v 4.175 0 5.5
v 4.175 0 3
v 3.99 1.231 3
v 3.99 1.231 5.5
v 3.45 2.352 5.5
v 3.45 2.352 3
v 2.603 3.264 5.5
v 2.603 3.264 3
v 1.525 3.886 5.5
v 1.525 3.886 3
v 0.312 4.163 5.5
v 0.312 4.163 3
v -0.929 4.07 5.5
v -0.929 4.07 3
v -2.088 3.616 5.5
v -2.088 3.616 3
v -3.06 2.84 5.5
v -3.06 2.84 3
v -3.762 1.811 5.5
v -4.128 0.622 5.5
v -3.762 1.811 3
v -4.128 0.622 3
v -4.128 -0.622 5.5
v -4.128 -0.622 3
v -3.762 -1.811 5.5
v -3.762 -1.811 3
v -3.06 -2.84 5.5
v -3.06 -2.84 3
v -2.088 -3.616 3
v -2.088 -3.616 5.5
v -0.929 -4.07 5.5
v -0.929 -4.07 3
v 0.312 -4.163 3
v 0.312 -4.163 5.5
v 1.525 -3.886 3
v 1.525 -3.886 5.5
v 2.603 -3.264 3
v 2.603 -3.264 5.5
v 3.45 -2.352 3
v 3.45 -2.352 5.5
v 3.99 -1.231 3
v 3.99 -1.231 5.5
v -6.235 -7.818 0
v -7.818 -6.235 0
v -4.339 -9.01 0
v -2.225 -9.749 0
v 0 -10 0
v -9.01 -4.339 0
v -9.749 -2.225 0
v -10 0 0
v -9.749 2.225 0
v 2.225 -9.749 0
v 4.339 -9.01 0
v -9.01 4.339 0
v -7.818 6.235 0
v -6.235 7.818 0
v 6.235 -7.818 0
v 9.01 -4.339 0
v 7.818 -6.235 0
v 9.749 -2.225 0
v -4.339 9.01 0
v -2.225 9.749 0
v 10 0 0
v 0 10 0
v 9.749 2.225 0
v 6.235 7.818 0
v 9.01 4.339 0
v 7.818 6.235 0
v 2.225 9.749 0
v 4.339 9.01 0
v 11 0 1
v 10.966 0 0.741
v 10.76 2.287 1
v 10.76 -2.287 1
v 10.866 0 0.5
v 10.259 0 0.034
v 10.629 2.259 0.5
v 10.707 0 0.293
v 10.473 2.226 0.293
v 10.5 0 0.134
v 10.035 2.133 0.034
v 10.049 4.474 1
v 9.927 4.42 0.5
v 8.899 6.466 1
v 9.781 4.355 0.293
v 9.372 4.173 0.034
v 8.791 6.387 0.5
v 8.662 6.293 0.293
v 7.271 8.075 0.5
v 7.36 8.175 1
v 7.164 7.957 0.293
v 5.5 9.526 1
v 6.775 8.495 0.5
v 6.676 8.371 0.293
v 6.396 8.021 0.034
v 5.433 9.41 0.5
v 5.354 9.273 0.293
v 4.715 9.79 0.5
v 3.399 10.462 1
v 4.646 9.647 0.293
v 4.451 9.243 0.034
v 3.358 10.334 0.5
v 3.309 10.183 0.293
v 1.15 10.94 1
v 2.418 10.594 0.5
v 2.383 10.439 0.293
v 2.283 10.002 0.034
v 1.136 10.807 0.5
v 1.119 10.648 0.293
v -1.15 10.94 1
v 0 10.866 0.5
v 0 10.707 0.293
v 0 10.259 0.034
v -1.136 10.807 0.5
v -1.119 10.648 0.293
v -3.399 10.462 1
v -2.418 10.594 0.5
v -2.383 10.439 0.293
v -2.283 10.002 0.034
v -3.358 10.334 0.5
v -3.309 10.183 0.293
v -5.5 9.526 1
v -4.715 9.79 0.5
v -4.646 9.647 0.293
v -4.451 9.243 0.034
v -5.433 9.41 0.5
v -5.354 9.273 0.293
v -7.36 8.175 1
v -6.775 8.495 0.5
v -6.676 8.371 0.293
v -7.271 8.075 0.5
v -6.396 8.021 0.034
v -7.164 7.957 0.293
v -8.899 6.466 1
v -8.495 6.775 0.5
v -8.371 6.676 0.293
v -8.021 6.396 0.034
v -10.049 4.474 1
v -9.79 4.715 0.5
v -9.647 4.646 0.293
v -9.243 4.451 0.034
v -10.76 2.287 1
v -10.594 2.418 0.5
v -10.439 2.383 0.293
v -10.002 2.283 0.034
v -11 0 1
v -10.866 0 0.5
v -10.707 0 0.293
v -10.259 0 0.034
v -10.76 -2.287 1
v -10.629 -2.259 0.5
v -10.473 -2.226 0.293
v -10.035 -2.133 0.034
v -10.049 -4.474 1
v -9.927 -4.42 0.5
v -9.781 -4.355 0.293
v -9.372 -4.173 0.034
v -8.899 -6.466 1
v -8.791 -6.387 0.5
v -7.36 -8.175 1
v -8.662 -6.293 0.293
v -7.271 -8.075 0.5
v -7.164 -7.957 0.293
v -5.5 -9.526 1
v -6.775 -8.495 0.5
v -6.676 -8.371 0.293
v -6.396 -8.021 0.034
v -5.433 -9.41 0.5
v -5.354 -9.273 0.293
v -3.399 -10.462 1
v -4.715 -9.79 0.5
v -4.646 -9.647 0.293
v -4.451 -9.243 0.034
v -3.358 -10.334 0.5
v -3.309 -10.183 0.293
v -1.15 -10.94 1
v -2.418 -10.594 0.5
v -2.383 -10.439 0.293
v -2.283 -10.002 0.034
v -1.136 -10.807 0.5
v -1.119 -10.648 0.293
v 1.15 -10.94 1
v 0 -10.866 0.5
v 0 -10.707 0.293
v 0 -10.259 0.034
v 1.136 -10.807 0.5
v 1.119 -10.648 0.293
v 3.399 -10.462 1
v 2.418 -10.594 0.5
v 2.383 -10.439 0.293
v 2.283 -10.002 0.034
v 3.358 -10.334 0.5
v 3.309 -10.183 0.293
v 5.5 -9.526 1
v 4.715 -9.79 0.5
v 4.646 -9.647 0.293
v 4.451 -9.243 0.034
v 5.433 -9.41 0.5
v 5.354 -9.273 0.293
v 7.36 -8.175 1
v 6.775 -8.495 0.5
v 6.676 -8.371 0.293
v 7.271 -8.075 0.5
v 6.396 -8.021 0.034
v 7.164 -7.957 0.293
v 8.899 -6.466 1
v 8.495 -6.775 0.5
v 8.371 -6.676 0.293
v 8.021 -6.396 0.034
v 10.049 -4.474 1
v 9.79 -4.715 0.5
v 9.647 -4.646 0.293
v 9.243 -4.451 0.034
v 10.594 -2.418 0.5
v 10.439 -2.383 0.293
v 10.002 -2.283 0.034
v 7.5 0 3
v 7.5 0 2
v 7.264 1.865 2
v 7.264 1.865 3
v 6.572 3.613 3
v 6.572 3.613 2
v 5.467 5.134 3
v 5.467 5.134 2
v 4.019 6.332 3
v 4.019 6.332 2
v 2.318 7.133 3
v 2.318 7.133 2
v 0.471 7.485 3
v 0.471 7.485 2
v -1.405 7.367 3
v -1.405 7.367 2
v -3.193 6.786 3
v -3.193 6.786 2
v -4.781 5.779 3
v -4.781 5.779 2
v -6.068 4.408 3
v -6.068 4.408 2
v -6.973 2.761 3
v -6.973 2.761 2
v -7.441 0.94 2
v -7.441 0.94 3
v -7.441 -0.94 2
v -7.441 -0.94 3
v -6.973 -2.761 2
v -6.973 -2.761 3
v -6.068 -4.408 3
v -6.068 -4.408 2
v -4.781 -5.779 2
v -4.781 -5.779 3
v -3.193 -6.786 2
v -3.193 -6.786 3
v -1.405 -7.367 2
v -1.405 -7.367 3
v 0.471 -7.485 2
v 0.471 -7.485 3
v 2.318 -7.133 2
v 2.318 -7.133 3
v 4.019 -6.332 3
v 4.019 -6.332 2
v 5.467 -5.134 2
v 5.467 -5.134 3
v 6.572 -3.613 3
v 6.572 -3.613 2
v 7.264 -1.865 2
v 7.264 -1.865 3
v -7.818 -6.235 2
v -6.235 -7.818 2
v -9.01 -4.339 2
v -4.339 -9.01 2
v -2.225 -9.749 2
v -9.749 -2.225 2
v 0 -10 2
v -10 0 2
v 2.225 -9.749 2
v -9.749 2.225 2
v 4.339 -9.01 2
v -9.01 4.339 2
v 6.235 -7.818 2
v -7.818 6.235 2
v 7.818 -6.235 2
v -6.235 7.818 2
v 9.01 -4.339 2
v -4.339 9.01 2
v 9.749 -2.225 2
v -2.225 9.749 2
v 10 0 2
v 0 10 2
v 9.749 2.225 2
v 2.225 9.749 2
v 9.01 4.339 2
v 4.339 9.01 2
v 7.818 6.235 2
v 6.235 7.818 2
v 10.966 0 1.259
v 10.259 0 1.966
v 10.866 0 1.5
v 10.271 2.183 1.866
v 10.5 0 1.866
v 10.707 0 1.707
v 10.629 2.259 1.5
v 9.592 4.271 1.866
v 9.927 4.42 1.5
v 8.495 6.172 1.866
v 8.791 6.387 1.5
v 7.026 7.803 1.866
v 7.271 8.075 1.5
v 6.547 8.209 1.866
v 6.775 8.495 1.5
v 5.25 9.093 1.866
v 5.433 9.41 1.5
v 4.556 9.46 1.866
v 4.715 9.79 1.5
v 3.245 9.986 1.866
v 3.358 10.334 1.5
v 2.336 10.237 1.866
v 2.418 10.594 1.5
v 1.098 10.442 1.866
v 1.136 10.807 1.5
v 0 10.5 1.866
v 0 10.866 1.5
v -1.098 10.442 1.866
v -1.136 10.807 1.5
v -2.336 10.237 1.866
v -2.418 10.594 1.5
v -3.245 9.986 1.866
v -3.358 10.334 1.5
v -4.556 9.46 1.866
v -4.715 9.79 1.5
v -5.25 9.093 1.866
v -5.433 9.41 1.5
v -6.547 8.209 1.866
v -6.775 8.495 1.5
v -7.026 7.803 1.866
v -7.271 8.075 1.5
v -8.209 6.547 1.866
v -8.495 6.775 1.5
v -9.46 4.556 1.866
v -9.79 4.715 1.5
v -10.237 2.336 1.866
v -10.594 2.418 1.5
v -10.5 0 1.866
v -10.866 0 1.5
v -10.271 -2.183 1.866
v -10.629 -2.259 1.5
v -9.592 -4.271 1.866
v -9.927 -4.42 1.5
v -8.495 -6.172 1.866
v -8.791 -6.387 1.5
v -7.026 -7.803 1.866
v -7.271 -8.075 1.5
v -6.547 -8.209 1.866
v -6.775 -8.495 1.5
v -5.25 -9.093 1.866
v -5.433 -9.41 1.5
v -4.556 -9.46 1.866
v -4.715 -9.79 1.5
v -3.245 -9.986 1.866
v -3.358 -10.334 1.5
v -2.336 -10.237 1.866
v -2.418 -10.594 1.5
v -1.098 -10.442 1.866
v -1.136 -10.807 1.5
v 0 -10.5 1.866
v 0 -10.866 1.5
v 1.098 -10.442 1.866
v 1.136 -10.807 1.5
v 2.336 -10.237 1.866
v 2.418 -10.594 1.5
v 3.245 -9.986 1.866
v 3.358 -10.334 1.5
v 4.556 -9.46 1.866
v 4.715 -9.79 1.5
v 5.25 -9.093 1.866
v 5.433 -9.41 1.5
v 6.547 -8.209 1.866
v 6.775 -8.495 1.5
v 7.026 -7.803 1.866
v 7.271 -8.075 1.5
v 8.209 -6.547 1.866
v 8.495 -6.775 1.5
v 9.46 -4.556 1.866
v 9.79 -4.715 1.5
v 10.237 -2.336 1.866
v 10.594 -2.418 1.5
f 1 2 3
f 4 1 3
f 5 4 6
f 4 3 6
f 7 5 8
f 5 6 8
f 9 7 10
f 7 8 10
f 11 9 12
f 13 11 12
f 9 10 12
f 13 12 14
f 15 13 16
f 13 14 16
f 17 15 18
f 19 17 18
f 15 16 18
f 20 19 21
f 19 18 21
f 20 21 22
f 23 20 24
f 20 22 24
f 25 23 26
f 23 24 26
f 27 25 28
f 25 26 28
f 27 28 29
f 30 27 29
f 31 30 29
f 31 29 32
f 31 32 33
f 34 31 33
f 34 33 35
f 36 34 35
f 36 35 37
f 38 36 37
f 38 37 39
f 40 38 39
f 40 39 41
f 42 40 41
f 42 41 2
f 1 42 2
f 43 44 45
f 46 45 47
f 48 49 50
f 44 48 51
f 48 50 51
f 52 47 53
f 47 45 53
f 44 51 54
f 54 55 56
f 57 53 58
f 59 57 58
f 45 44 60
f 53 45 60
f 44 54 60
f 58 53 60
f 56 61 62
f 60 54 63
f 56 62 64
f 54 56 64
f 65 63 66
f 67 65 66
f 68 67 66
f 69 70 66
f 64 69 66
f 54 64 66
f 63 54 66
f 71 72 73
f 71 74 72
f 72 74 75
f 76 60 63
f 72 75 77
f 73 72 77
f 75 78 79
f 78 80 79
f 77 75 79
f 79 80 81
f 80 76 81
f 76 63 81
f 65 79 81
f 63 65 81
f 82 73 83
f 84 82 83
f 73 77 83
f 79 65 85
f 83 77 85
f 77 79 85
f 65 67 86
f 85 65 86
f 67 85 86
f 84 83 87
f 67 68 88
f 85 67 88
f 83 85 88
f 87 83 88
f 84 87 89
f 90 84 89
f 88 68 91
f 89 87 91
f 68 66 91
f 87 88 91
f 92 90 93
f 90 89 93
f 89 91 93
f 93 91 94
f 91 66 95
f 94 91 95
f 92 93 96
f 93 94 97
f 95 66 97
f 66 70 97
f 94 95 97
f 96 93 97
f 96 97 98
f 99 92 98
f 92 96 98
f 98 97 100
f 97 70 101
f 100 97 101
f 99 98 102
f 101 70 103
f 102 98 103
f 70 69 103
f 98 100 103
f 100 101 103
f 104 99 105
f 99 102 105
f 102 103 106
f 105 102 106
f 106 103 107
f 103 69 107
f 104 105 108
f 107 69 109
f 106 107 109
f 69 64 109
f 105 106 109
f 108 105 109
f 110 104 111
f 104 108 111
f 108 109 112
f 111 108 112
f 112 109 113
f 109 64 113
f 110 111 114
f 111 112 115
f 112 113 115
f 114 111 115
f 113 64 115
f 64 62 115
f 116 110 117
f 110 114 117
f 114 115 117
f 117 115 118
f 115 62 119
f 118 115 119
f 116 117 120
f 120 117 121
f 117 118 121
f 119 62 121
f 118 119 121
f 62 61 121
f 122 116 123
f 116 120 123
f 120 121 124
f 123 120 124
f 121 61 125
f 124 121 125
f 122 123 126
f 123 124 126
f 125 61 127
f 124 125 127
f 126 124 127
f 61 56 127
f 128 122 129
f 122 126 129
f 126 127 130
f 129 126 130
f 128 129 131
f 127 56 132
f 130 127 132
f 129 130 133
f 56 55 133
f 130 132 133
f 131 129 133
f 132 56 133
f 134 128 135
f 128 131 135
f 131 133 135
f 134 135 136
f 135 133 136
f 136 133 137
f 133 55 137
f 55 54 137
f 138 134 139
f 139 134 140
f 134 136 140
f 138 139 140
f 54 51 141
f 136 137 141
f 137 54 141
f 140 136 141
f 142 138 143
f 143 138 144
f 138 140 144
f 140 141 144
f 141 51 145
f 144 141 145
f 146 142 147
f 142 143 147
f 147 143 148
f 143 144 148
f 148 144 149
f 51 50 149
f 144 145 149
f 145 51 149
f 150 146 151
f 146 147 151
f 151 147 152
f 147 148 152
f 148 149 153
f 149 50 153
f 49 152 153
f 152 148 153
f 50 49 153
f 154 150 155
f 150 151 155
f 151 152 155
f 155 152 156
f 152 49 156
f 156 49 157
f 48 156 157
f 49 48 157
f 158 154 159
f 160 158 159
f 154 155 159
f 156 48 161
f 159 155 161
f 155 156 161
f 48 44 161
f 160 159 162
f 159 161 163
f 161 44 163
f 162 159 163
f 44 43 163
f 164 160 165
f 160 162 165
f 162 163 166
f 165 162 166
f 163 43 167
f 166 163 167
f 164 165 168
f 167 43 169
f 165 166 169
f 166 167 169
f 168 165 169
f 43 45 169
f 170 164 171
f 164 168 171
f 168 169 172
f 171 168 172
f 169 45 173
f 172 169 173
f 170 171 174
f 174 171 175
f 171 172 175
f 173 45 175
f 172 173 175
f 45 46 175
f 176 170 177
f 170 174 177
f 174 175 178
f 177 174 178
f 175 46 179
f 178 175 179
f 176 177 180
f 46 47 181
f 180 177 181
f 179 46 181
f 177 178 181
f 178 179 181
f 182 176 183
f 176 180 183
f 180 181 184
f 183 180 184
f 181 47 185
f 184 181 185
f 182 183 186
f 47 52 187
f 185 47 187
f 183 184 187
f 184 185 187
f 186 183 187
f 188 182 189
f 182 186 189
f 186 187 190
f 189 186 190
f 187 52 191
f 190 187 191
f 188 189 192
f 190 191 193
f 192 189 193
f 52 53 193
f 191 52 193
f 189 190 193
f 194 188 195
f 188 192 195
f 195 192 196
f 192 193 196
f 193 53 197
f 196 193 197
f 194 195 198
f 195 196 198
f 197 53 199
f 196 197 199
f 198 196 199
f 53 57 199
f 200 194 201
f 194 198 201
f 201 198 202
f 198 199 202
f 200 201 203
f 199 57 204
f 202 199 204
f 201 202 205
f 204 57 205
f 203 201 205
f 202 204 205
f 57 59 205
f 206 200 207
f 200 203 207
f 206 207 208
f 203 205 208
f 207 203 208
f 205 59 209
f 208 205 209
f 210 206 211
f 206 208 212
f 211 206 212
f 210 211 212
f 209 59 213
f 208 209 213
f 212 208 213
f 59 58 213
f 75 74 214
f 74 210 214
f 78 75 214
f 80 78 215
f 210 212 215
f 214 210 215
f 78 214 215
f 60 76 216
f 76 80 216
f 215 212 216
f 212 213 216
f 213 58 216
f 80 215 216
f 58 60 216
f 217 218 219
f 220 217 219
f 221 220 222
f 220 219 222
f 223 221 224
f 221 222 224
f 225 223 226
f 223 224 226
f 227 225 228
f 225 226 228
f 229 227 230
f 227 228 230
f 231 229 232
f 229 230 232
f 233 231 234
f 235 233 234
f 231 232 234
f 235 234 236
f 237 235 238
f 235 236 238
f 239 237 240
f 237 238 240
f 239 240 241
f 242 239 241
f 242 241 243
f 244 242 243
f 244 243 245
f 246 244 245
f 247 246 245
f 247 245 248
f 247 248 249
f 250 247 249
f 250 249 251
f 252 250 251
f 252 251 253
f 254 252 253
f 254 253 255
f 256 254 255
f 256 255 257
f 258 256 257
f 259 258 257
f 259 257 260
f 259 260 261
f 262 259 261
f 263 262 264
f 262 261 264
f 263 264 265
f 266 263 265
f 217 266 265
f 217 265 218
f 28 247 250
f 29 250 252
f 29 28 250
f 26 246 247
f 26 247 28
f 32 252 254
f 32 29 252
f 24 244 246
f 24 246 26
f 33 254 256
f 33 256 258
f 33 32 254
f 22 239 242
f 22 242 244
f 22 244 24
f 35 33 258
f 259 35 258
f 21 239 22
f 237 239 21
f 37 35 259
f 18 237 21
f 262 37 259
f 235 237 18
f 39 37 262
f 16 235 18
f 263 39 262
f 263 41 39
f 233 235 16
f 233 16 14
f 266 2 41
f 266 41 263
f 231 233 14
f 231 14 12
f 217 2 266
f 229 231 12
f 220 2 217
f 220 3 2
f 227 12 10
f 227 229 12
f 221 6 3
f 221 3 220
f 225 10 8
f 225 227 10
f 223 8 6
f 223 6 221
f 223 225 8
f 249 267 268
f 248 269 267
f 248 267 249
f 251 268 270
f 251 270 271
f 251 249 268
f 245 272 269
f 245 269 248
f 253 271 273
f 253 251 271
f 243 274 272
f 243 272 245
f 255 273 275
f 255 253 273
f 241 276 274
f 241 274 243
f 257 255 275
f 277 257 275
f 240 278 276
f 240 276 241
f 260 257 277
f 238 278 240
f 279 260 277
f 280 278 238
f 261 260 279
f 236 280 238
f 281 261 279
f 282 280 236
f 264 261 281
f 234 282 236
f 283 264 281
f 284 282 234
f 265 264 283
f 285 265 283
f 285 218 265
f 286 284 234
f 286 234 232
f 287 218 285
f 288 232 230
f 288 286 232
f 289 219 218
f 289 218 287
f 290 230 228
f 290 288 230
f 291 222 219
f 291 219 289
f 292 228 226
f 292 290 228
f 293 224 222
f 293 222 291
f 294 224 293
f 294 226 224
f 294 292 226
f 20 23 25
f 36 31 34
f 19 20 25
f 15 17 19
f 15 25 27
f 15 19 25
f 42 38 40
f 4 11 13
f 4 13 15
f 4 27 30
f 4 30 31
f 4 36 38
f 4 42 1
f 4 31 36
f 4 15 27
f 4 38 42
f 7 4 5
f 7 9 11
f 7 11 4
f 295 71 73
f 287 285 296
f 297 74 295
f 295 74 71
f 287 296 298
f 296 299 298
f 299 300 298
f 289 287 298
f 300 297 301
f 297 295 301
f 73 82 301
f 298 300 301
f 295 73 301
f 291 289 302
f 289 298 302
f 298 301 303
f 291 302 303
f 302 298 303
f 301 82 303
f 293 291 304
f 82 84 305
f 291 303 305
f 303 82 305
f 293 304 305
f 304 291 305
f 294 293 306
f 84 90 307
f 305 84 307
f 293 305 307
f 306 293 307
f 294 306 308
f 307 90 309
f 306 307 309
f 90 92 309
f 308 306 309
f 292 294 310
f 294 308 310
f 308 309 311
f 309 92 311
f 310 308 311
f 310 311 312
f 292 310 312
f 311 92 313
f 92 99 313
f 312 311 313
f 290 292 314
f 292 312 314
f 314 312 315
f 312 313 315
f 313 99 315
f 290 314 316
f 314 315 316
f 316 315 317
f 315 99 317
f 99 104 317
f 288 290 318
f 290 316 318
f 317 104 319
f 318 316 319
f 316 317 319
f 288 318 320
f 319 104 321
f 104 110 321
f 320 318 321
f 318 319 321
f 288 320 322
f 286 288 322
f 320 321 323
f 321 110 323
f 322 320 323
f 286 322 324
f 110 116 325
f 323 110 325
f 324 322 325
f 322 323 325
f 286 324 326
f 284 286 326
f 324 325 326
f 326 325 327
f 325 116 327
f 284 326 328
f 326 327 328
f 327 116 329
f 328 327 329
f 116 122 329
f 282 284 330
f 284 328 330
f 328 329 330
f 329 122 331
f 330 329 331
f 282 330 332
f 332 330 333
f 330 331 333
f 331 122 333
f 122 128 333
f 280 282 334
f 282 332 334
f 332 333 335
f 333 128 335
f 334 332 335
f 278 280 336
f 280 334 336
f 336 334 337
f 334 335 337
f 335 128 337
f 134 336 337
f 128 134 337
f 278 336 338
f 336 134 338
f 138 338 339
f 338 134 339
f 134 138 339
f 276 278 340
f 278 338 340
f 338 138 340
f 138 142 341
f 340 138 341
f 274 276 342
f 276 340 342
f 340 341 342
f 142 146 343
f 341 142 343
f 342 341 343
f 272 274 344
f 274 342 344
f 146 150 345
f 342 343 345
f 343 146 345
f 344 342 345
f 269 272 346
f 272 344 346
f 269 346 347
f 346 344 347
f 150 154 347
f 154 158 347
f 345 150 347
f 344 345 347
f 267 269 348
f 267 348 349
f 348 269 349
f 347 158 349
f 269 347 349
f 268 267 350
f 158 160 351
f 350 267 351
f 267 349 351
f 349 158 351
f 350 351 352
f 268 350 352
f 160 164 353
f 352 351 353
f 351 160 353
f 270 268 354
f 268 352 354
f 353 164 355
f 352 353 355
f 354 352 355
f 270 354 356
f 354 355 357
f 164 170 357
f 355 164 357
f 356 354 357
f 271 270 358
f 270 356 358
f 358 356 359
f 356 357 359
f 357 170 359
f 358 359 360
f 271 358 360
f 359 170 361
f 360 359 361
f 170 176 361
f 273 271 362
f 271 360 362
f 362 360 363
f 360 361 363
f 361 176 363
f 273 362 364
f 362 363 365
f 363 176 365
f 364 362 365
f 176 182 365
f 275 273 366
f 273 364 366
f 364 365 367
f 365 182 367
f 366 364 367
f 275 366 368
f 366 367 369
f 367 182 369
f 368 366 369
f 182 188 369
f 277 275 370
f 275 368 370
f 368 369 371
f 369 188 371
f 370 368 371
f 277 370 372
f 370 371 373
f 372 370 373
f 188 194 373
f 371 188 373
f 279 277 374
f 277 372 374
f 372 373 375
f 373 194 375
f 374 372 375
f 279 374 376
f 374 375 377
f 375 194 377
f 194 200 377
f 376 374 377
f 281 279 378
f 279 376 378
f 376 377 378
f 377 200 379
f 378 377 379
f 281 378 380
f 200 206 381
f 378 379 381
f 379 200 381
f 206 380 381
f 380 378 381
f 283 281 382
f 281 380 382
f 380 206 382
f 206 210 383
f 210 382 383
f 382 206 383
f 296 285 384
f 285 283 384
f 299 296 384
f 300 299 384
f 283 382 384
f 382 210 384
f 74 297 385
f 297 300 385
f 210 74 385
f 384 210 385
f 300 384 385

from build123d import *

# Parameters (mm, degrees)
F0_R     = 11
F0_R_2   = 7.5
F1_DEPTH = 2
F0_R_3   = 4.175
F2_DEPTH = 3
F3_DEPTH = 5.5
F4_R     = 0.99999


# Not quite as in the source:
# - a fillet or chamfer is up to 0.001 mm smaller than in the source, because OpenCascade refuses the exact size


with BuildPart() as f1:
    # F0 (on Top) → F1 (new body)
    with BuildSketch(Plane.XY):
        Circle(F0_R)
        Circle(F0_R_2, mode=Mode.SUBTRACT)
    extrude(amount=F1_DEPTH)

    # F0 (on Top) → F2 (join)
    with BuildSketch(Plane.XY):
        Circle(F0_R_2)
        Circle(F0_R_3, mode=Mode.SUBTRACT)
    extrude(amount=F2_DEPTH)

    # F0 (on Top) → F3 (join)
    with BuildSketch(Plane.XY):
        Circle(F0_R_3)
    extrude(amount=F3_DEPTH)

    # F4 (radius 1 in the source; OpenCascade refuses exactly that, so slightly less here)
    f4_edges = [f1.edges().sort_by_distance(p)[0] for p in [
        (-11, 0, 2),
        (-11, 0, 0),
    ]]
    fillet(f4_edges, radius=F4_R)


solid = f1.part
